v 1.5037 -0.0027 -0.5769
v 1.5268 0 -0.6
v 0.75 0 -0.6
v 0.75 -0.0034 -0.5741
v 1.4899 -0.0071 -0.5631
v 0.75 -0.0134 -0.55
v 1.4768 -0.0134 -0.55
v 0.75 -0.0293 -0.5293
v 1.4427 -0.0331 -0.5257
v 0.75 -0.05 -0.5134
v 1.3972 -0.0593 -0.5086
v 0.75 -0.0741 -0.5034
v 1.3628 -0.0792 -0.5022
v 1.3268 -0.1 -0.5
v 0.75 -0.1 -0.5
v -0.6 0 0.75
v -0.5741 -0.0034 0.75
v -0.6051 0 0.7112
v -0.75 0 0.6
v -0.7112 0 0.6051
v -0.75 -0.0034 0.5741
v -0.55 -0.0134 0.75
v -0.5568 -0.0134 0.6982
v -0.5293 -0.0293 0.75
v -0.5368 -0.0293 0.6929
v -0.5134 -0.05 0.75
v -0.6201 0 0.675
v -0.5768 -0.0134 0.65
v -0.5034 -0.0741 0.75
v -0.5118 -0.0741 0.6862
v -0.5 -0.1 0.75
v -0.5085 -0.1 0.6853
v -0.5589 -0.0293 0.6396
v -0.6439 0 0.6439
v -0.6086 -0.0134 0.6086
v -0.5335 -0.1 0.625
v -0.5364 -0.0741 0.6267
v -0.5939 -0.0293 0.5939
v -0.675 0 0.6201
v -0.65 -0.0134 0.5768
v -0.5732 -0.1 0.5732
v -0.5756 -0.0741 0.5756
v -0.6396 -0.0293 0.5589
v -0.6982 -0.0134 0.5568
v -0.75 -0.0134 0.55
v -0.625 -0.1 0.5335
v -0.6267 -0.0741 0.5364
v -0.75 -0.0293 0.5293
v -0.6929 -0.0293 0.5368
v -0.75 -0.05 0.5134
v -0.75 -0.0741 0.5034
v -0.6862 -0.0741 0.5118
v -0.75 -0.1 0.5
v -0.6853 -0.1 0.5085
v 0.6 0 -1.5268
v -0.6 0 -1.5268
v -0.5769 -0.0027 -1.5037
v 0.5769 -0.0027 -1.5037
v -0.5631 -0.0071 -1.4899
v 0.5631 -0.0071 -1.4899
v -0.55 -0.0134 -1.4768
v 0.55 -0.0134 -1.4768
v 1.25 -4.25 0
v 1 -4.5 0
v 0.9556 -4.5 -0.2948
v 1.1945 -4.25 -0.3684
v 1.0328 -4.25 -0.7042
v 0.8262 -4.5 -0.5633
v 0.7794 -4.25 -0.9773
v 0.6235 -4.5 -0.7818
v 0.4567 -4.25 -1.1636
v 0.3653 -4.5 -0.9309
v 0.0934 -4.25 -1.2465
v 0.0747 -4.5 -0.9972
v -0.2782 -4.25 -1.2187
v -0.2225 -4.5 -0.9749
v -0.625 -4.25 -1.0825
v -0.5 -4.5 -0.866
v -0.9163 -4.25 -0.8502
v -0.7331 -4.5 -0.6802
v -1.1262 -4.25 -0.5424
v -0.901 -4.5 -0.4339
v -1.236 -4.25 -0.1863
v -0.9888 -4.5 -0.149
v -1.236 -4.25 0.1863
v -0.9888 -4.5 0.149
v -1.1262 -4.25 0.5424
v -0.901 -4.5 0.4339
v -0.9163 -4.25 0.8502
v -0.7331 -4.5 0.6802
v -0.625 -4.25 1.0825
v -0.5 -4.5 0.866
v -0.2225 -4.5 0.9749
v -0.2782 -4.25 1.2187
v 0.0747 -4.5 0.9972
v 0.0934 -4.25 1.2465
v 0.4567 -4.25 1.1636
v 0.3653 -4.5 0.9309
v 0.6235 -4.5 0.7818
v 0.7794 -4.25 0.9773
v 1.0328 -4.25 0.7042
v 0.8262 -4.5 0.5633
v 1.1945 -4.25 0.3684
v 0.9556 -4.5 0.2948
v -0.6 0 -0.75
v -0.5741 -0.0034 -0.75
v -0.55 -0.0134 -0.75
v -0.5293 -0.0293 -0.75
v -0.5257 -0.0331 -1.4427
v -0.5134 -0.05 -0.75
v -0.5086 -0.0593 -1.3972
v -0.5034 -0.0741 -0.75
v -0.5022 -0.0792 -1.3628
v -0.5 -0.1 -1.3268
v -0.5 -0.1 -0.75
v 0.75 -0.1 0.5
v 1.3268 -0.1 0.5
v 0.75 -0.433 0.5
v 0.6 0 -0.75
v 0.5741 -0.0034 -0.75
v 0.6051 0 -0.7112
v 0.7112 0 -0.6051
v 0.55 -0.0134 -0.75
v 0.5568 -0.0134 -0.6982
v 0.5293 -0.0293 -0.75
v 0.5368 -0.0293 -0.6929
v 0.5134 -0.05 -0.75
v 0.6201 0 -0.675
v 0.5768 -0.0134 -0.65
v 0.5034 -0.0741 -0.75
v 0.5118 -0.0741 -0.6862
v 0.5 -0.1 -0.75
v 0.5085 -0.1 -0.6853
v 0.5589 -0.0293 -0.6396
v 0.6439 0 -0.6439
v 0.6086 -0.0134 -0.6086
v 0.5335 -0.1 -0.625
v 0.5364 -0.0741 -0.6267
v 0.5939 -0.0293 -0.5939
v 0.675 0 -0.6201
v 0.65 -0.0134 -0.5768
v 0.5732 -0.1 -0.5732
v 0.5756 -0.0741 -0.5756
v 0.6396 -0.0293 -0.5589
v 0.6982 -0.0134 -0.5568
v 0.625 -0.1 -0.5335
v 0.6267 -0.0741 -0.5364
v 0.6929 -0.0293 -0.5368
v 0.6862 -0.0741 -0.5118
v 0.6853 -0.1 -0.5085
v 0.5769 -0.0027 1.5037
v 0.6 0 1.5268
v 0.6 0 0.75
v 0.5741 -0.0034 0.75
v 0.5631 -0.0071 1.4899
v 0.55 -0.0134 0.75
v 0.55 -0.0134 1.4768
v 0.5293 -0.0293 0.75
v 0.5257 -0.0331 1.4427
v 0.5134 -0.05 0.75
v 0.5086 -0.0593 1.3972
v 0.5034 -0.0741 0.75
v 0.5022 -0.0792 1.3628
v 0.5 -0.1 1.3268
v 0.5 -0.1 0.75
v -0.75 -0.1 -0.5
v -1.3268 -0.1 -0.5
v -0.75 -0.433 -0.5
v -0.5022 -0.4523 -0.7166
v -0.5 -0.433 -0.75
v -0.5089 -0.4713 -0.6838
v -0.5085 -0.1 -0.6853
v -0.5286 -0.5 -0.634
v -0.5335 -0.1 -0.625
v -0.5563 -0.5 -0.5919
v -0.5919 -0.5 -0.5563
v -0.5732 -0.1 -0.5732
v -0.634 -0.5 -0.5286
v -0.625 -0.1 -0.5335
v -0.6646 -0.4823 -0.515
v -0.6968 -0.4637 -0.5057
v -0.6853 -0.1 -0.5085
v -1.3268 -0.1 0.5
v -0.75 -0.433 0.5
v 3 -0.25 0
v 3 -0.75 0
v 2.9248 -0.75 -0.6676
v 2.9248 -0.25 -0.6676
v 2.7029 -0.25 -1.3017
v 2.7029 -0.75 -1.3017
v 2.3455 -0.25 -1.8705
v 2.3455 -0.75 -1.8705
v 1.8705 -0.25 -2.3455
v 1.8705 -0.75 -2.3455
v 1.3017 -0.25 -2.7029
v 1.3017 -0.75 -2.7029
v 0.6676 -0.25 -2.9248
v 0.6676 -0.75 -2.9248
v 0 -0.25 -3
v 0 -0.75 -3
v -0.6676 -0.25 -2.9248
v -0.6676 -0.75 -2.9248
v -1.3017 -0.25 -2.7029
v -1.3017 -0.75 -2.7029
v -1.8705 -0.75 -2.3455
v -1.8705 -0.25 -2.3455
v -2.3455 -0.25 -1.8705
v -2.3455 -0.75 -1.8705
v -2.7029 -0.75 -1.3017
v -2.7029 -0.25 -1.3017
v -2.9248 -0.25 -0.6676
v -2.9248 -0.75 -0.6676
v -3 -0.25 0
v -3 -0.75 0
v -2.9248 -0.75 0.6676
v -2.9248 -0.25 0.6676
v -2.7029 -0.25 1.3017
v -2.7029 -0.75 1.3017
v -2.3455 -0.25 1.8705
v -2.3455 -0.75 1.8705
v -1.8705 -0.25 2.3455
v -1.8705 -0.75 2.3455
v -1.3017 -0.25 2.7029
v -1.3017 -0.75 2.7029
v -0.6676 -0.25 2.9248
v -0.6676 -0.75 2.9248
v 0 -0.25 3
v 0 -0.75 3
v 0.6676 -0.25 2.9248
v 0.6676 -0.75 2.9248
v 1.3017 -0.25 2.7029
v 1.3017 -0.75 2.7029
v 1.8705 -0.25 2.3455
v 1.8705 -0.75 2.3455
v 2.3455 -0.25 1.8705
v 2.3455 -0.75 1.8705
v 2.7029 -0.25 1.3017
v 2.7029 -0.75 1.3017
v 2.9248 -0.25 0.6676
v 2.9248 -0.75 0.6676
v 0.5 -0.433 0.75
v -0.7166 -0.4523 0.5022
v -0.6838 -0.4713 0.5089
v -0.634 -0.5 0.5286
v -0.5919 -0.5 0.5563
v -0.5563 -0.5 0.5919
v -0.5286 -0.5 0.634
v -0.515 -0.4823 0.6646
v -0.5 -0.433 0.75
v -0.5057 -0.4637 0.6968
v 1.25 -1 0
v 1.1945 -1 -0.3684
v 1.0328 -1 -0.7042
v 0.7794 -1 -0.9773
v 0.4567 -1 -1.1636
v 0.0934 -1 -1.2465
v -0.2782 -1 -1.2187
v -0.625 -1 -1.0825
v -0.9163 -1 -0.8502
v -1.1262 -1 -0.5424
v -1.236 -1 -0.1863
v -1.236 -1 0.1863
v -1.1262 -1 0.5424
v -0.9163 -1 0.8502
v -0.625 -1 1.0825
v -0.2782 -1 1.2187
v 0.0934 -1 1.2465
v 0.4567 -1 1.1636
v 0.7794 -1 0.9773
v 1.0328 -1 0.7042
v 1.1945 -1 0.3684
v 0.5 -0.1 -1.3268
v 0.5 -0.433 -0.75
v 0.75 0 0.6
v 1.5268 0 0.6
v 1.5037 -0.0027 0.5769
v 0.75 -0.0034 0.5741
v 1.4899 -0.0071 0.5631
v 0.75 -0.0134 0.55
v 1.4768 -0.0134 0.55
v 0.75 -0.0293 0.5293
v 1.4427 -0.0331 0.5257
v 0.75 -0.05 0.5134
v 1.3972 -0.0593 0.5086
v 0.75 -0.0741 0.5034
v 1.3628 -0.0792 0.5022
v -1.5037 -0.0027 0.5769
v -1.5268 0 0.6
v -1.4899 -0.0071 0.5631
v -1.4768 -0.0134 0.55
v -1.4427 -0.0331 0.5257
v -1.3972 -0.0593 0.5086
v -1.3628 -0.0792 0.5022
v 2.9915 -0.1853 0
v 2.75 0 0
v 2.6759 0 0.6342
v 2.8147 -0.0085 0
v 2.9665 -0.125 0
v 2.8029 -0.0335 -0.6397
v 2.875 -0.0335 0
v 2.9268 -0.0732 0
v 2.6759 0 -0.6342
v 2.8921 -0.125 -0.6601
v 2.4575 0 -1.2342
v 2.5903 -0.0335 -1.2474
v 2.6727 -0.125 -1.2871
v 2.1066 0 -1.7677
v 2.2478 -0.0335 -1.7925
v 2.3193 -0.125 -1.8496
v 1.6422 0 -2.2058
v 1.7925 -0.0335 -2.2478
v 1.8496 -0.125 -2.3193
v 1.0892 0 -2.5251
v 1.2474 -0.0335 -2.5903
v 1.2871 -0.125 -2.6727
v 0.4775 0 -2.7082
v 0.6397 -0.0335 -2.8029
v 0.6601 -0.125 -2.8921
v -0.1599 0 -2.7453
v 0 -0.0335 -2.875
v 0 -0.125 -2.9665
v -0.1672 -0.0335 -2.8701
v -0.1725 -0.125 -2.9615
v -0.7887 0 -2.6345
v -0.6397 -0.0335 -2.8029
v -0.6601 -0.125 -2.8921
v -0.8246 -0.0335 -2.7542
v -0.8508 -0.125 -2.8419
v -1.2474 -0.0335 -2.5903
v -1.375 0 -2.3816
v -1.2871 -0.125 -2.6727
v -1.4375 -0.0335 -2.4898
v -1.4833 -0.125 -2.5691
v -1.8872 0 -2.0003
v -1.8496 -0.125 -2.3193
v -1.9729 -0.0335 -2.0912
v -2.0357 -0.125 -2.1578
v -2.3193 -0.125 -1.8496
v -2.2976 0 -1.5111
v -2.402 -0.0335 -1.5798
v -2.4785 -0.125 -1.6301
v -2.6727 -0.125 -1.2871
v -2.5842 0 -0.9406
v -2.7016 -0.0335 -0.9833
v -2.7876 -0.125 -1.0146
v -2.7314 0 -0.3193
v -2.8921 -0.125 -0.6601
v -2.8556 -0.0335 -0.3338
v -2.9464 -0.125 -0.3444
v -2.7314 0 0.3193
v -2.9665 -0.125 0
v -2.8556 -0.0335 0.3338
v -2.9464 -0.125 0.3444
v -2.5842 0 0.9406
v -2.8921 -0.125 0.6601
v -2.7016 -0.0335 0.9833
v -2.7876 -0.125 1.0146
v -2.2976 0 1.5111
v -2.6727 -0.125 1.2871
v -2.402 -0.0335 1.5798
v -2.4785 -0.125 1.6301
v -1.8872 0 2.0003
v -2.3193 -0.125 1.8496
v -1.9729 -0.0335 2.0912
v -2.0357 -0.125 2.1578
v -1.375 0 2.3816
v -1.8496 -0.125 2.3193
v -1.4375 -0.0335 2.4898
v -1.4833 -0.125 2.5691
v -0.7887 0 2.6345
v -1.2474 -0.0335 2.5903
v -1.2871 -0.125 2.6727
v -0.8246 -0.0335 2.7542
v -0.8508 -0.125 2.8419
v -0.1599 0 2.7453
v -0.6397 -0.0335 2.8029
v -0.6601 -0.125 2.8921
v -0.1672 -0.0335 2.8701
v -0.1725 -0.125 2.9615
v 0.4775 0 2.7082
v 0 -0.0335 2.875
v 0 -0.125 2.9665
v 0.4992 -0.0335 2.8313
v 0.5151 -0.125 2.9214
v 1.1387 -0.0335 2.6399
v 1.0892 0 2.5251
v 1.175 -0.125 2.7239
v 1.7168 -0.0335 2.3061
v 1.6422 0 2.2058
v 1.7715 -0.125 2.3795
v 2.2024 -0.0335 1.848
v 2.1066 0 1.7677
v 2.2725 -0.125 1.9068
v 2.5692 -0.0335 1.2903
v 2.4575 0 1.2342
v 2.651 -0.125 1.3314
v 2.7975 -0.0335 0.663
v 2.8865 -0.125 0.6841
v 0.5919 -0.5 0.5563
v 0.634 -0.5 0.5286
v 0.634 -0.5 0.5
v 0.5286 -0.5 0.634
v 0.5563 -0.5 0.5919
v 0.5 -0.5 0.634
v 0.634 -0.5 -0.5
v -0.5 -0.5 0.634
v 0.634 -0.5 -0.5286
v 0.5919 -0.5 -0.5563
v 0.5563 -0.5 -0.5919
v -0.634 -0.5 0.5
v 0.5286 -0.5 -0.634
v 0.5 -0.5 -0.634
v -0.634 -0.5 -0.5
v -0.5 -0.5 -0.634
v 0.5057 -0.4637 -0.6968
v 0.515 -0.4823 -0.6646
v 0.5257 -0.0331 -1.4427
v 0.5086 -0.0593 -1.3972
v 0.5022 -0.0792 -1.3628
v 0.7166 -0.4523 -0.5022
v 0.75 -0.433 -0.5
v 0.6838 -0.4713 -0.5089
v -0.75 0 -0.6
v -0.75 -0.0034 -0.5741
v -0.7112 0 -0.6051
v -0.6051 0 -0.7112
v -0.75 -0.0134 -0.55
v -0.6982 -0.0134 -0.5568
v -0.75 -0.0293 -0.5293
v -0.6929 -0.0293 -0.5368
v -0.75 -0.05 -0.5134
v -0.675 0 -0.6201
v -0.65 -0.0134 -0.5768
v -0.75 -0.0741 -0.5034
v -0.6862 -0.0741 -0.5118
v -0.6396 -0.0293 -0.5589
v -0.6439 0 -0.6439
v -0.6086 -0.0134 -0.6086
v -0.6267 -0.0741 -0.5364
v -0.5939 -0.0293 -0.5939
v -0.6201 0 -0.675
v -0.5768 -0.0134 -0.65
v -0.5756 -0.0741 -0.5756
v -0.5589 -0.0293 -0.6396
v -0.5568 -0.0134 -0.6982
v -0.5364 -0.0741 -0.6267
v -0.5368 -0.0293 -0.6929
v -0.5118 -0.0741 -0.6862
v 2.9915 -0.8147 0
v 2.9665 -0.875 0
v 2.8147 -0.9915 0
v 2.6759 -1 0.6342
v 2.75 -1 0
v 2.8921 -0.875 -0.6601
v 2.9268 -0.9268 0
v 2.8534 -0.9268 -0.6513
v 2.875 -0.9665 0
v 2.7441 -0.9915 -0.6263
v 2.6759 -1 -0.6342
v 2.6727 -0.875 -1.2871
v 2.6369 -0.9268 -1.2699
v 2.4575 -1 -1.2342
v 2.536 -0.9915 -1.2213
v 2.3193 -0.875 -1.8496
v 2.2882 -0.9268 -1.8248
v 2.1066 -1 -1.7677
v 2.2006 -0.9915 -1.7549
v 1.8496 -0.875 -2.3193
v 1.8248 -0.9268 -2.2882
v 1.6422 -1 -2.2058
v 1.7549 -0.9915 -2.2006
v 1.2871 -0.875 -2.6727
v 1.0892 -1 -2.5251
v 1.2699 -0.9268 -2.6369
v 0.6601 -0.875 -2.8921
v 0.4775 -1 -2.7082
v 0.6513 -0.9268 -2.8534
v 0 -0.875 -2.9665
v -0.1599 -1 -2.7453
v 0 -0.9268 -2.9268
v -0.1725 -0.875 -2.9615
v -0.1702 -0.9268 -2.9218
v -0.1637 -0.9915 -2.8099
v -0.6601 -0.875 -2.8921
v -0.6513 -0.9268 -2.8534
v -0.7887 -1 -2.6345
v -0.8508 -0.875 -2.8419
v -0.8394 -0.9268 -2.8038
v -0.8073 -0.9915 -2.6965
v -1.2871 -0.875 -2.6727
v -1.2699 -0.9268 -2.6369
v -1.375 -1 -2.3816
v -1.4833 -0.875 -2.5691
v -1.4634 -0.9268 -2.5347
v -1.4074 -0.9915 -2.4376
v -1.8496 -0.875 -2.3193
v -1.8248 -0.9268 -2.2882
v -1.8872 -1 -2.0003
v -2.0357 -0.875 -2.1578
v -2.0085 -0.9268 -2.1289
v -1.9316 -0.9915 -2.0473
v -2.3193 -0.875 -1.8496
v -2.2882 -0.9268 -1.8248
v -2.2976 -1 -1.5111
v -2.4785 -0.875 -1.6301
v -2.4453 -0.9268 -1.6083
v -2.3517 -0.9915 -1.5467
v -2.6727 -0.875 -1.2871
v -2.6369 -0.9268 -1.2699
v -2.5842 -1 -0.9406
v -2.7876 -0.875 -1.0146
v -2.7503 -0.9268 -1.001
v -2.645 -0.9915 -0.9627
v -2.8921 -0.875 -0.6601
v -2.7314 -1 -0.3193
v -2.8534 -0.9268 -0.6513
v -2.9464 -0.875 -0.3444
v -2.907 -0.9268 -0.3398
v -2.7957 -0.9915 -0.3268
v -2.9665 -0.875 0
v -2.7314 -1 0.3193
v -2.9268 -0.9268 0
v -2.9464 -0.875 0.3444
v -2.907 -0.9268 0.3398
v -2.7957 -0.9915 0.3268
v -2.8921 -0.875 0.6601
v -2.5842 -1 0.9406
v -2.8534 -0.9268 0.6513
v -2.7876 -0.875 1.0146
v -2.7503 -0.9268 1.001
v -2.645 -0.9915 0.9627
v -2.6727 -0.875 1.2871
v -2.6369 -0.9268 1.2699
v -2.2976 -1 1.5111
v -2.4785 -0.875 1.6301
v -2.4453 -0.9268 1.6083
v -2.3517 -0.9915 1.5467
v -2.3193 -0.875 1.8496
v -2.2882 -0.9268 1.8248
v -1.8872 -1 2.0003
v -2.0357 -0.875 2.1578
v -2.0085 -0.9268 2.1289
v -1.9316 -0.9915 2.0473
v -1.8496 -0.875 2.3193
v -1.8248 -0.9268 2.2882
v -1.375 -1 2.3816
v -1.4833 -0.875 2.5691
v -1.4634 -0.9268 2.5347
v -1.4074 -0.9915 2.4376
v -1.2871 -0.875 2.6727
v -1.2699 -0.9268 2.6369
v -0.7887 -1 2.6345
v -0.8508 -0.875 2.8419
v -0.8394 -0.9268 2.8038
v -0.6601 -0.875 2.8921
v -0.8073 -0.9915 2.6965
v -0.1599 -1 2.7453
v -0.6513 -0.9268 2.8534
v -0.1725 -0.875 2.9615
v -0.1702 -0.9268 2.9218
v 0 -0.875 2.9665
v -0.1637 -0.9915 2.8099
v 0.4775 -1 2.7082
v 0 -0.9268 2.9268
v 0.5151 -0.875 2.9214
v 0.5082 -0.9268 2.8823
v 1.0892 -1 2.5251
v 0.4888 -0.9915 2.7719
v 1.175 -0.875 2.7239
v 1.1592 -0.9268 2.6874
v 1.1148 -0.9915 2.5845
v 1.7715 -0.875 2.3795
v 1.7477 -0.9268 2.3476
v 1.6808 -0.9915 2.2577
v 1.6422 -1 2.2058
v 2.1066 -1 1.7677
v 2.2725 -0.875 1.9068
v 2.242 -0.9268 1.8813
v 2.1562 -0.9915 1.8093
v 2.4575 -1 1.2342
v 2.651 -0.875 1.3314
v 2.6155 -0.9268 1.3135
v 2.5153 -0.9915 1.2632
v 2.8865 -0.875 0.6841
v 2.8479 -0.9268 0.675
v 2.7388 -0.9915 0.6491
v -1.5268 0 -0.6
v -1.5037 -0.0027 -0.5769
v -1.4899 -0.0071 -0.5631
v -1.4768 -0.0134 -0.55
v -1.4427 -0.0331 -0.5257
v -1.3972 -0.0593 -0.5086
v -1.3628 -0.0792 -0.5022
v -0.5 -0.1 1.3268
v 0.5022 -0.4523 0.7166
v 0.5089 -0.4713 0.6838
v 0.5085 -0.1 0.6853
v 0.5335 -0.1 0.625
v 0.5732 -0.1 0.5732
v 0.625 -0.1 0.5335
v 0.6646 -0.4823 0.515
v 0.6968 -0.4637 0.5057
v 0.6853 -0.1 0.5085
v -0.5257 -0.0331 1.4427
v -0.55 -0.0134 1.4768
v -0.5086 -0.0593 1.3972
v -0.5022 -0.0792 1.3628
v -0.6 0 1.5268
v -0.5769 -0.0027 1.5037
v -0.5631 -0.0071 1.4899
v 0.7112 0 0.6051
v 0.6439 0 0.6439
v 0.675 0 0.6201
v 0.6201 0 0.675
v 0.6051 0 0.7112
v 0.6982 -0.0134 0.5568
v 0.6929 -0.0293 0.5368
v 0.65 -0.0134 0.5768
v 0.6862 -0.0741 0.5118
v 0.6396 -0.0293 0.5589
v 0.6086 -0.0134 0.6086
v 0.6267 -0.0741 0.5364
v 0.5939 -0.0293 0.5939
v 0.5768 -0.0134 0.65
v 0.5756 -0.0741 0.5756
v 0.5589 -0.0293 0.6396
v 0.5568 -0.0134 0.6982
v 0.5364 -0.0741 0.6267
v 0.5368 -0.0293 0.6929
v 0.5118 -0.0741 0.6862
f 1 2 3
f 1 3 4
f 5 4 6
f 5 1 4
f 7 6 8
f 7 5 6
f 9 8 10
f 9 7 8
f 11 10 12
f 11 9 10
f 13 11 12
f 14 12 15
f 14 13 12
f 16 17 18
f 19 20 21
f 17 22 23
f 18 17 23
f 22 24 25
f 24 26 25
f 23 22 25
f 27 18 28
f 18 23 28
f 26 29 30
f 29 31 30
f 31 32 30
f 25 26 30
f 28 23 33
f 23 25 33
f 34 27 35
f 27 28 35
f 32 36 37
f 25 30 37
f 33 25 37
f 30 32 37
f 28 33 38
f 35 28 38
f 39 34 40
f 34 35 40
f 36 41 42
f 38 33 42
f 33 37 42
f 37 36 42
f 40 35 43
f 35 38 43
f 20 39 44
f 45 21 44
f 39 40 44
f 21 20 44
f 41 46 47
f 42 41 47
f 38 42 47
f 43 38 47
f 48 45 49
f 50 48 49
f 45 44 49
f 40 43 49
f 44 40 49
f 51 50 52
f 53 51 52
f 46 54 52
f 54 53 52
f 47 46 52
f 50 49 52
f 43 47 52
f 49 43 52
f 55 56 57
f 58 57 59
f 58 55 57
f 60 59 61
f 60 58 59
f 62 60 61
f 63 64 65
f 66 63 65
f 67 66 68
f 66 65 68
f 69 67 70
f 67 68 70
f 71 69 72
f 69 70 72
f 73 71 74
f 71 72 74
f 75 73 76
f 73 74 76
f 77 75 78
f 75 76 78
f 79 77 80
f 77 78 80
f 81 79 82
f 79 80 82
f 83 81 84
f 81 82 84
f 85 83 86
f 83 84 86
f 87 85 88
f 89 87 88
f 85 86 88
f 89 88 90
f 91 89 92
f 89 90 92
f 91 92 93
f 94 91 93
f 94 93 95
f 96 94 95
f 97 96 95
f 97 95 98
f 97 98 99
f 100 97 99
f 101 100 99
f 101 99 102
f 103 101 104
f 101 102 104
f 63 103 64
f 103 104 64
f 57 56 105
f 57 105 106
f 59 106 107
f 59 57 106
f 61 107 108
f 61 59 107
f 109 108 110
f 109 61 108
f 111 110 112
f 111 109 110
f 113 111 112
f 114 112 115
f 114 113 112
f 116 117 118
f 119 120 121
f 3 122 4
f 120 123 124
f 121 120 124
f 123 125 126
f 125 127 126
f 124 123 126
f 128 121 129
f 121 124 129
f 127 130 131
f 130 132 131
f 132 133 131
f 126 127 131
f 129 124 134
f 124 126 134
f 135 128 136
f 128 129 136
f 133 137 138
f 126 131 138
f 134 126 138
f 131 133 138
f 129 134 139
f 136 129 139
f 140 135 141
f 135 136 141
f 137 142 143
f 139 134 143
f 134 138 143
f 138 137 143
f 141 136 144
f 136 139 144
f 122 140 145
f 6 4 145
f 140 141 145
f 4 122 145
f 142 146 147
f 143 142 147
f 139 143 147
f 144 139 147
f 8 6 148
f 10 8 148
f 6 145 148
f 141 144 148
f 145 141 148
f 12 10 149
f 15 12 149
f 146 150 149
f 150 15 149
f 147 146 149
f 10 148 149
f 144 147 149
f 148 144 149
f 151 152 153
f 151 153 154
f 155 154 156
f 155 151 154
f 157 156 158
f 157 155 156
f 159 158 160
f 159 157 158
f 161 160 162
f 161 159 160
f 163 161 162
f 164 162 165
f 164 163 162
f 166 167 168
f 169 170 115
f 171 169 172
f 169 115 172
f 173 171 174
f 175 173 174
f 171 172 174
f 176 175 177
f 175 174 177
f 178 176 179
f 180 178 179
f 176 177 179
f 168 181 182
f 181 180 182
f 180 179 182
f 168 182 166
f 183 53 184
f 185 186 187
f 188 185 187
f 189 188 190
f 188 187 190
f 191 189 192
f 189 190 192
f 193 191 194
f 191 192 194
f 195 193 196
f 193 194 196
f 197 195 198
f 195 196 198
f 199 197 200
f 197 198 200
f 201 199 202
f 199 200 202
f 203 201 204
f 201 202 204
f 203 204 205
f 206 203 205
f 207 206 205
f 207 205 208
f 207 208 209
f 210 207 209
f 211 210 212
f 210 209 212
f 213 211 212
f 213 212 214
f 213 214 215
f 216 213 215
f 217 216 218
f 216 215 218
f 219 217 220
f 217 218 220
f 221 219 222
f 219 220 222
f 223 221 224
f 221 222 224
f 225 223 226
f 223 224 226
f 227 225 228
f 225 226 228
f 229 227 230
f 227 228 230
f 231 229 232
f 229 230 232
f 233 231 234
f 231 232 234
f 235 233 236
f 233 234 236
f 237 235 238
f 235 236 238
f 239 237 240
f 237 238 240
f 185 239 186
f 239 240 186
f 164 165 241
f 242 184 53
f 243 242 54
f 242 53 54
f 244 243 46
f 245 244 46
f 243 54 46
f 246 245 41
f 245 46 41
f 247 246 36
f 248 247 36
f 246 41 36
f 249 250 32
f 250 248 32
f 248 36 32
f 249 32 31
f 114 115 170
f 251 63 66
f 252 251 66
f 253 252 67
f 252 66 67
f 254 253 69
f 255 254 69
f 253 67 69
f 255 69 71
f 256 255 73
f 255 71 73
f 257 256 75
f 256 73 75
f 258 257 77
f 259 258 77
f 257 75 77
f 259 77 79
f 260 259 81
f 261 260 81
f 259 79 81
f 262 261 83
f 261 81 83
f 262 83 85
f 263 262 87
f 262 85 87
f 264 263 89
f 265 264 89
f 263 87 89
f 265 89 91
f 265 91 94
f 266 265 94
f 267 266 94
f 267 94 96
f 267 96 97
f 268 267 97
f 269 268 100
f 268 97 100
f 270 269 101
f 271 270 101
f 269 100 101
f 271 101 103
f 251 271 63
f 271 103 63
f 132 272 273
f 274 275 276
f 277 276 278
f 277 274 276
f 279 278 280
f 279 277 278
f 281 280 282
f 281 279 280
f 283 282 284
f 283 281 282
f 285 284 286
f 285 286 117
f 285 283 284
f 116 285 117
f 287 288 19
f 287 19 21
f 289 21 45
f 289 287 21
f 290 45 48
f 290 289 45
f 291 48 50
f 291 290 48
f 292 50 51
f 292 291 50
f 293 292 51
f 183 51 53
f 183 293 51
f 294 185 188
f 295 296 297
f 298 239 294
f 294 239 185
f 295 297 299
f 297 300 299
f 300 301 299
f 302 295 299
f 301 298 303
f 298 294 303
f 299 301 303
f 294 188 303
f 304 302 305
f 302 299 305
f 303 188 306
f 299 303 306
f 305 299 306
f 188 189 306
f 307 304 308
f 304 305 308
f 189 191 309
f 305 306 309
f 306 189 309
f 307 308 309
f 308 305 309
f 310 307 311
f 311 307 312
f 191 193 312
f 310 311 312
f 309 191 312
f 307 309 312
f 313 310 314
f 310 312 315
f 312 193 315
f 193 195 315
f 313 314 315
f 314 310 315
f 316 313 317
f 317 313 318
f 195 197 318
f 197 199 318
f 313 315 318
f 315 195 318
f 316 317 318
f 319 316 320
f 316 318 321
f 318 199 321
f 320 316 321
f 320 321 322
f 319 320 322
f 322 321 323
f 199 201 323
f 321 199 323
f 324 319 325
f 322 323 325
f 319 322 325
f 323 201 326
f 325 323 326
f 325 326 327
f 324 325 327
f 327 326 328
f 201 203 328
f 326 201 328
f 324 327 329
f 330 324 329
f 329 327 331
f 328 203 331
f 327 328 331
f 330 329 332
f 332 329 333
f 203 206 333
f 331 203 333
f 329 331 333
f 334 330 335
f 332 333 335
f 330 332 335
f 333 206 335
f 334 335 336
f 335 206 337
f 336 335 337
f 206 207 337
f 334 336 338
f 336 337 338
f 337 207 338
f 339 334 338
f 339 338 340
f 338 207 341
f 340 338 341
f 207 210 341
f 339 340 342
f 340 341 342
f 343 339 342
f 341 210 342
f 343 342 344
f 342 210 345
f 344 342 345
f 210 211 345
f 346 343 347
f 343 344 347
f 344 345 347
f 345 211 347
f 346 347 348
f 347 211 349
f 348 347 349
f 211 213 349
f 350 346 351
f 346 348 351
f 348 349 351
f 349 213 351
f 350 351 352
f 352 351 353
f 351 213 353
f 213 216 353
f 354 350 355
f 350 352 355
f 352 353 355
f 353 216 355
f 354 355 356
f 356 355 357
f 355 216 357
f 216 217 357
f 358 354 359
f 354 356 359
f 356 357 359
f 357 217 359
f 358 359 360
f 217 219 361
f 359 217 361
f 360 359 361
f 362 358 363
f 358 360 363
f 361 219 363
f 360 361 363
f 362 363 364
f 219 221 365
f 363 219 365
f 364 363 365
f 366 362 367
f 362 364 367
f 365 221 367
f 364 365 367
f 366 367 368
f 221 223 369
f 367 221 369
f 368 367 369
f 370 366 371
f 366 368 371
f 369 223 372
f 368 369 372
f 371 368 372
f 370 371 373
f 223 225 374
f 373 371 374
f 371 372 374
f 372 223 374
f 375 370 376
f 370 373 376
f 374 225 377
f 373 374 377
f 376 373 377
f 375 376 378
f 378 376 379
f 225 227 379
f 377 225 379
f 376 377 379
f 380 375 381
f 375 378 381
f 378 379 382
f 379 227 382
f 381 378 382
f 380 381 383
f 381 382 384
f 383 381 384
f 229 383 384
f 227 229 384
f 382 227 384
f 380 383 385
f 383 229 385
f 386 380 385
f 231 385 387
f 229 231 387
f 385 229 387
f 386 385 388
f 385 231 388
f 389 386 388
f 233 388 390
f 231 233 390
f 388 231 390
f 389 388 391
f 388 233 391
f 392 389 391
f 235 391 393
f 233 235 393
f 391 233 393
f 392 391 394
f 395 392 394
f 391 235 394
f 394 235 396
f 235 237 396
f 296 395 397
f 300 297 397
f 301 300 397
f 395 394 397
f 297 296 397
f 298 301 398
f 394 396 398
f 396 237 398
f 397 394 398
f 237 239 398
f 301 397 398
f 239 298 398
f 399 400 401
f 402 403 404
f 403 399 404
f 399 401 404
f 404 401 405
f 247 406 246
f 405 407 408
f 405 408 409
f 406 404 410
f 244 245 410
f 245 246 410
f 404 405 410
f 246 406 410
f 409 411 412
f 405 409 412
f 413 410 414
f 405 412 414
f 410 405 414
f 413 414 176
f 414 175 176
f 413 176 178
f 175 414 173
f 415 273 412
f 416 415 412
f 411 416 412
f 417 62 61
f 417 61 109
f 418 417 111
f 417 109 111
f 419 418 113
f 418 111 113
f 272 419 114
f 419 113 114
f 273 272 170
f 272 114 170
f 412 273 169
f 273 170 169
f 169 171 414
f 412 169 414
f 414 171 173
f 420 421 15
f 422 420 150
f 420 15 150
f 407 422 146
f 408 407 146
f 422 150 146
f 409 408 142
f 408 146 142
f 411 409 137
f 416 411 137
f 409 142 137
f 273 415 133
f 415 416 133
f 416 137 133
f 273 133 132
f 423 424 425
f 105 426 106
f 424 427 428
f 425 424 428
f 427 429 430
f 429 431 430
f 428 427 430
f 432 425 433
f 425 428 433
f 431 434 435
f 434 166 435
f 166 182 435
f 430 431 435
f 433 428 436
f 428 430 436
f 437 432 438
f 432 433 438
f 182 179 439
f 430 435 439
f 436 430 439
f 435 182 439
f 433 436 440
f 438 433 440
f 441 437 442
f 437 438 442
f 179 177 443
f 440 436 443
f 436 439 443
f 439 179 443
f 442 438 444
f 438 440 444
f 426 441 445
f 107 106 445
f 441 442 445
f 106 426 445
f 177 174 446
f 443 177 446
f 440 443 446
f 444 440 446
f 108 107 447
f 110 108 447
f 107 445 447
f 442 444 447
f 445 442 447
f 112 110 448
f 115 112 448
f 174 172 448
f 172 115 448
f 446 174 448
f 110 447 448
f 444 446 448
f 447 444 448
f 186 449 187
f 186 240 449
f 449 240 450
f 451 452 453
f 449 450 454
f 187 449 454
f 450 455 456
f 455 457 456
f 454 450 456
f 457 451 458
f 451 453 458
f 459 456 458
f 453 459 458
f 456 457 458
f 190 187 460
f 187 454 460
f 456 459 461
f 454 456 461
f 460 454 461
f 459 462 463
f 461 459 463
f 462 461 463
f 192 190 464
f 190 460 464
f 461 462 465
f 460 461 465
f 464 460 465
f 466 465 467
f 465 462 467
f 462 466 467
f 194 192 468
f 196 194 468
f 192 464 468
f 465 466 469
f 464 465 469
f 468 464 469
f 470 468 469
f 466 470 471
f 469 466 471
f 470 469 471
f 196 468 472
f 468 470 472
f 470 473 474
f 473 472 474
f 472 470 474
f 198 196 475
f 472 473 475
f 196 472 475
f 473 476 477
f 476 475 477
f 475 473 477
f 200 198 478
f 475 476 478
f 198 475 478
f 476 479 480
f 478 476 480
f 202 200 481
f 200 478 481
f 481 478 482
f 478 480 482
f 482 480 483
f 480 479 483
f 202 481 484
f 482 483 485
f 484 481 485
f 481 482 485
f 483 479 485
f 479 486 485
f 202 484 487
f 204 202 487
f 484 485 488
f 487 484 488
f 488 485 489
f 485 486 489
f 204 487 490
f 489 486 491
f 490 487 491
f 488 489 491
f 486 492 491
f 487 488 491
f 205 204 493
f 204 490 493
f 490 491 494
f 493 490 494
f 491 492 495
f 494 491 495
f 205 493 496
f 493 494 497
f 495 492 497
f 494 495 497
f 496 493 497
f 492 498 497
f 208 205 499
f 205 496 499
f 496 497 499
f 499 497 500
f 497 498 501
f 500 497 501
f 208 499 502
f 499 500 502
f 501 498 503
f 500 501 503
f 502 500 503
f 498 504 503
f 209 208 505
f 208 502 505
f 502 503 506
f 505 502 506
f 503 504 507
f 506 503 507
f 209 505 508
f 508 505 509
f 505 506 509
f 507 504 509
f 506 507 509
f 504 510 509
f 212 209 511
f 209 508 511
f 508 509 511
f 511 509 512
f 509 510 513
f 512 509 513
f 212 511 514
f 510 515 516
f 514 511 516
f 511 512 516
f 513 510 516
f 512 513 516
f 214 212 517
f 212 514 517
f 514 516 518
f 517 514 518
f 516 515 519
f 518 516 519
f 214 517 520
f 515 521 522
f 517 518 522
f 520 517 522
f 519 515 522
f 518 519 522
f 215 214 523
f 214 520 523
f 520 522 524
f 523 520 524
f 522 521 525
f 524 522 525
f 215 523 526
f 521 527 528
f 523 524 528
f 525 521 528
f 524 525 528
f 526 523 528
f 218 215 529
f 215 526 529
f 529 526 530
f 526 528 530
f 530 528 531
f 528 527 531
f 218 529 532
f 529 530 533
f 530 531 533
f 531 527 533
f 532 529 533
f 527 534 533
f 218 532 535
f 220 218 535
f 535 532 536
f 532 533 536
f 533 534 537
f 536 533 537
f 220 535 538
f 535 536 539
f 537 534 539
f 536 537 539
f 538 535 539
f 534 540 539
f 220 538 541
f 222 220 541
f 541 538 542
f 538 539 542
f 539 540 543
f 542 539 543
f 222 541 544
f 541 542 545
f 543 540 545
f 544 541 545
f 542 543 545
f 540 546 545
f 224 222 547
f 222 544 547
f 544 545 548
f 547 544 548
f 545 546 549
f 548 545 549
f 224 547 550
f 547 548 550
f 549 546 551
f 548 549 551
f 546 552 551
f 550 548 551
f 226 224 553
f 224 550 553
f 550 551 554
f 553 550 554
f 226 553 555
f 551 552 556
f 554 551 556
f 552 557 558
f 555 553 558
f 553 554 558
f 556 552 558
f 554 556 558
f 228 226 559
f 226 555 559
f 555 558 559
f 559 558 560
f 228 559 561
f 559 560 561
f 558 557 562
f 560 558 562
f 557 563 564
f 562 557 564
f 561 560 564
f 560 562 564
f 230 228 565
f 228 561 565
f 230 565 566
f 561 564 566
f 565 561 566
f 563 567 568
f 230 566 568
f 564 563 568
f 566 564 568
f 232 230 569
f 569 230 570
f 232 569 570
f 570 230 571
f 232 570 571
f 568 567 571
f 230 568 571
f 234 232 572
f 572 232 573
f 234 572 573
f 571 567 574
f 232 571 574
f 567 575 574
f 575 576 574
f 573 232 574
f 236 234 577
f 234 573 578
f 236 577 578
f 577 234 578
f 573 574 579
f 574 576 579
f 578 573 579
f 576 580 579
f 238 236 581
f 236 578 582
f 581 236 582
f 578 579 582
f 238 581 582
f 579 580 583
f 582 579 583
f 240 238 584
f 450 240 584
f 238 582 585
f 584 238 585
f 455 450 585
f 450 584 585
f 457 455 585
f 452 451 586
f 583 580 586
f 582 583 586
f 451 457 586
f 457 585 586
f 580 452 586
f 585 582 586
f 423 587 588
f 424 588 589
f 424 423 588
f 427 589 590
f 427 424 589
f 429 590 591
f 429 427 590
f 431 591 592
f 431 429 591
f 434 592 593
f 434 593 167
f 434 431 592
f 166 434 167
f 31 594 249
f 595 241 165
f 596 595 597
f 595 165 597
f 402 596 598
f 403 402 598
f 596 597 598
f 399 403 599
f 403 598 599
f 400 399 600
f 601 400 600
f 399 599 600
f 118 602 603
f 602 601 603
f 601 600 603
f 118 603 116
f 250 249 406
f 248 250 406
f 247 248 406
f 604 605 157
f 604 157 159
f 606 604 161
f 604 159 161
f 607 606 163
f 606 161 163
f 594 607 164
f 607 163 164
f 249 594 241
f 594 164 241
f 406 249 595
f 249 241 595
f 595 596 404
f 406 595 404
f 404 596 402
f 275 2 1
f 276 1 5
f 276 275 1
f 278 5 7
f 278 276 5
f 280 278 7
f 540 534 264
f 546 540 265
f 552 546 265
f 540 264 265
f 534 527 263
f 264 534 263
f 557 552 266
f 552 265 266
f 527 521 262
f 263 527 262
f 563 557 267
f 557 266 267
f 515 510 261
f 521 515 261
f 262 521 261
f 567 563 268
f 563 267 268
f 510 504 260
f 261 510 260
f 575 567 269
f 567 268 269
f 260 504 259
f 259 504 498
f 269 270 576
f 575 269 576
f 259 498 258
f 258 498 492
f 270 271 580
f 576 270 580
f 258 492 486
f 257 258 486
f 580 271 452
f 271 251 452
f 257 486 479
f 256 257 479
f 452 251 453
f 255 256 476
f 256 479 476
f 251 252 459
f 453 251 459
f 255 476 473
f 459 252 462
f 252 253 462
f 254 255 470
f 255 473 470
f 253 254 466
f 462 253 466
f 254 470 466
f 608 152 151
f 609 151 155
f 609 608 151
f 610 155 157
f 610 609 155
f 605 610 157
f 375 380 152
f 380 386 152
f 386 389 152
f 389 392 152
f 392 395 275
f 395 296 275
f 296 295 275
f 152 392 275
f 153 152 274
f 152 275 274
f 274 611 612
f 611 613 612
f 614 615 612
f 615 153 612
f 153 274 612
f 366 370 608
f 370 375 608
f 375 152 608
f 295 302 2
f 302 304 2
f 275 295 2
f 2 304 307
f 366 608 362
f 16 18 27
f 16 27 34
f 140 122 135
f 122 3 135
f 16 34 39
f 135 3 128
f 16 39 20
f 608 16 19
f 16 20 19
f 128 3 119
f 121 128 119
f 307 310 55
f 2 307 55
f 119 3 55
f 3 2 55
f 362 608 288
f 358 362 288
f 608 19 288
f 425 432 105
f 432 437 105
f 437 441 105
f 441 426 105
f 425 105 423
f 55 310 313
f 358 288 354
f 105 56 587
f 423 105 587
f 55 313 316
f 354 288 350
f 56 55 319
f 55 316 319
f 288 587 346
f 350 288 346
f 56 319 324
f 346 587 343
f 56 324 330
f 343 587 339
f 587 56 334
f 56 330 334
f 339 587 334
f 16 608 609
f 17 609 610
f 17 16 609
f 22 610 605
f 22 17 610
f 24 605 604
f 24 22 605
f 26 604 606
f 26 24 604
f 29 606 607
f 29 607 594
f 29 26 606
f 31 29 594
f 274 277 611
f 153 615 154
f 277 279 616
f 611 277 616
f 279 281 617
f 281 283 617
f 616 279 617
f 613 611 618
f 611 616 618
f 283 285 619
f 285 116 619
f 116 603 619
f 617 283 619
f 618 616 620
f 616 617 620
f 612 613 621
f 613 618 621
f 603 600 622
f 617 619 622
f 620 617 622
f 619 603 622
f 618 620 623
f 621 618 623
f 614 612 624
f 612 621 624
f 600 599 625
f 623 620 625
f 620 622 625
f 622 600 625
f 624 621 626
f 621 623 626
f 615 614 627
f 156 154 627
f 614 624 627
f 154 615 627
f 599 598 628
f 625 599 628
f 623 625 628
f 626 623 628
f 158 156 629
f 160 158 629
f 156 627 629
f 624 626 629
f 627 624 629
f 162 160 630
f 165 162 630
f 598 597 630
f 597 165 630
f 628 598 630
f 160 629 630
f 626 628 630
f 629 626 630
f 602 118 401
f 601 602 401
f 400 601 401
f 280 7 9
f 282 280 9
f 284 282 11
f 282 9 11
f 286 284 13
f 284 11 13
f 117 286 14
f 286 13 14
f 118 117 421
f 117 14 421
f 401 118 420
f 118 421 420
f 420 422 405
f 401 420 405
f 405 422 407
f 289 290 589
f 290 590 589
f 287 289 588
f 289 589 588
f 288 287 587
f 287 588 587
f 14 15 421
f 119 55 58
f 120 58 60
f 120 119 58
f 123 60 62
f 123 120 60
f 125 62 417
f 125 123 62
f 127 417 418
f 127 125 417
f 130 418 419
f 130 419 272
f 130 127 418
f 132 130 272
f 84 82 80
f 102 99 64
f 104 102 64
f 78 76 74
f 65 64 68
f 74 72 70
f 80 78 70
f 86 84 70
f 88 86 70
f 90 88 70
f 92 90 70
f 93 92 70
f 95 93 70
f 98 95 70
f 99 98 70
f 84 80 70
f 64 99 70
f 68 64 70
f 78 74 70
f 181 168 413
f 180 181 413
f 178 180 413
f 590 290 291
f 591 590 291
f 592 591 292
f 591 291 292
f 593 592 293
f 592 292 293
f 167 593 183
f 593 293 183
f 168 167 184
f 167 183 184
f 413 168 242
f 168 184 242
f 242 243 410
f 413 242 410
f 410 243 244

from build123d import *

# Parameters (mm, degrees)
CUT_EXTRUDE1_DEPTH = 0.5
CHAMFER1_SIZE      = 0.5
CHAMFER1_SIZE_2    = 0.866025404
FILLET1_R          = 0.25
FILLET2_R          = 0.1
FILLET3_R          = 0.25
CHAMFER2_SIZE      = 0.25


with BuildPart() as part:
    # Sketch1 → Revolve1 (revolve)
    with BuildSketch(Plane.XY):
        Polygon((0, 0), (3, 0), (3, -1), (1.25, -1), (1.25, -4.5), (0, -4.5), align=None)
    revolve(axis=Axis((0, -217.245924753, 0), (0, 1, 0)))

    # Sketch2 → Cut-Extrude1 (cut)
    with BuildSketch(Plane(origin=(0, 0, 0), x_dir=(1, 0, 0), z_dir=(0, 1, 0))):
        Polygon((-0.5, 0.5), (-0.5, 1.5), (0.5, 1.5), (0.5, 0.5), (1.5, 0.5), (1.5, -0.5), (0.5, -0.5), (0.5, -1.5), (-0.5, -1.5), (-0.5, -0.5), (-1.5, -0.5), (-1.5, 0.5), align=None)
    extrude(amount=-CUT_EXTRUDE1_DEPTH, mode=Mode.SUBTRACT)

    # Chamfer1
    # the kernel refuses this chamfer: 0.866025404, 0.5 mm, written as the material it adds along each edge
    with BuildSketch(Plane(origin=(-1.5, -0.5, 0.5), x_dir=(-0.0578938624026749, 0.9983227437537924, 0), z_dir=(0, 0, -1)), Plane(origin=(0.5, -0.5, 1.5), x_dir=(-3.4244955923263397e-15, 0.9983227437537926, 0.057893862402671484), z_dir=(-1, 0, 0)), Plane(origin=(1.5, -0.5, -0.5), x_dir=(0.057893862402667626, 0.9983227437537928, 0), z_dir=(0, 0, 1)), Plane(origin=(-0.5, -0.5, -1.5), x_dir=(-3.4244955923263397e-15, 0.9983227437537926, -0.057893862402671484), z_dir=(1, 0, 0))) as chamfer1_piece_1:
        Polygon((CHAMFER1_SIZE * 0.998322743754, CHAMFER1_SIZE * 0.0578938624027), (-CHAMFER1_SIZE_2 * 0.0578938623883, CHAMFER1_SIZE_2 * 0.998322743505), (0, 0), align=None)
    extrude(amount=1)

    # Fillet1
    # the kernel refuses this fillet: 0.25 mm, written as the material it takes off along each edge
    with BuildSketch(Plane(origin=(-0.5, 0.625, 0.5), x_dir=(-1, 0, 0), z_dir=(0, -1, 0))) as fillet1_piece_1_section:
        with BuildLine():
            CenterArc((FILLET1_R, -FILLET1_R), FILLET1_R, 90, 90)
            Line((0, -FILLET1_R), (0, 0))
            Line((0, 0), (FILLET1_R, 0))
        make_face()
    fillet1_piece_1 = extrude(amount=1.125, mode=Mode.PRIVATE)
    fillet1_piece_1 = split(fillet1_piece_1, bisect_by=Plane(origin=(-0.82036424, -0.392387889, 0.556422311), z_dir=(0.4999999999999566, 0.8660254037844637, 0)), keep=Keep.TOP, mode=Mode.PRIVATE)
    fillet1_piece_1 = split(fillet1_piece_1, bisect_by=Plane(origin=(-0.556422311, -0.392387889, 0.82036424), z_dir=(0, 0.8660254037844637, -0.4999999999999566)), keep=Keep.TOP, mode=Mode.PRIVATE)
    add(fillet1_piece_1, mode=Mode.SUBTRACT)
    with BuildSketch(Plane(origin=(-0.5, 0.625, -0.5), x_dir=(-1, 0, 0), z_dir=(0, -1, 0))) as fillet1_piece_2_section:
        with BuildLine():
            CenterArc((FILLET1_R, FILLET1_R), FILLET1_R, 180, 90)
            Line((0, FILLET1_R), (0, 0))
            Line((0, 0), (FILLET1_R, 0))
        make_face()
    fillet1_piece_2 = extrude(amount=1.125, mode=Mode.PRIVATE)
    fillet1_piece_2 = split(fillet1_piece_2, bisect_by=Plane(origin=(-0.82036424, -0.392387889, -0.556422311), z_dir=(0.4999999999999566, 0.8660254037844637, 0)), keep=Keep.TOP, mode=Mode.PRIVATE)
    fillet1_piece_2 = split(fillet1_piece_2, bisect_by=Plane(origin=(-0.556422311, -0.392387889, -0.82036424), z_dir=(0, 0.8660254037844637, 0.4999999999999566)), keep=Keep.TOP, mode=Mode.PRIVATE)
    add(fillet1_piece_2, mode=Mode.SUBTRACT)
    with BuildSketch(Plane(origin=(0.5, 0.625, 0.5), x_dir=(1, 0, 0), z_dir=(0, -1, 0))) as fillet1_piece_3_section:
        with BuildLine():
            CenterArc((FILLET1_R, FILLET1_R), FILLET1_R, 180, 90)
            Line((0, FILLET1_R), (0, 0))
            Line((0, 0), (FILLET1_R, 0))
        make_face()
    fillet1_piece_3 = extrude(amount=1.125, mode=Mode.PRIVATE)
    fillet1_piece_3 = split(fillet1_piece_3, bisect_by=Plane(origin=(0.82036424, -0.392387889, 0.556422311), z_dir=(-0.4999999999999566, 0.8660254037844637, 0)), keep=Keep.TOP, mode=Mode.PRIVATE)
    fillet1_piece_3 = split(fillet1_piece_3, bisect_by=Plane(origin=(0.556422311, -0.392387889, 0.82036424), z_dir=(0, 0.8660254037844637, -0.4999999999999566)), keep=Keep.TOP, mode=Mode.PRIVATE)
    add(fillet1_piece_3, mode=Mode.SUBTRACT)
    with BuildSketch(Plane(origin=(0.5, 0.625, -0.5), x_dir=(0, 0, -1), z_dir=(0, -1, 0))) as fillet1_piece_4_section:
        with BuildLine():
            CenterArc((FILLET1_R, FILLET1_R), FILLET1_R, 180, 90)
            Line((0, FILLET1_R), (0, 0))
            Line((0, 0), (FILLET1_R, 0))
        make_face()
    fillet1_piece_4 = extrude(amount=1.125, mode=Mode.PRIVATE)
    fillet1_piece_4 = split(fillet1_piece_4, bisect_by=Plane(origin=(0.556422311, -0.392387889, -0.82036424), z_dir=(0, 0.8660254037844637, 0.4999999999999566)), keep=Keep.TOP, mode=Mode.PRIVATE)
    fillet1_piece_4 = split(fillet1_piece_4, bisect_by=Plane(origin=(0.82036424, -0.392387889, -0.556422311), z_dir=(-0.4999999999999566, 0.8660254037844637, 0)), keep=Keep.TOP, mode=Mode.PRIVATE)
    add(fillet1_piece_4, mode=Mode.SUBTRACT)

    # Fillet2
    fillet2_edges = [part.edges().sort_by_distance(p)[0] for p in [
        (-1.5, 0, 0),
        (-1.125, 0, 0.5),
        (0, 0, 1.5),
        (0.5, 0, 1.125),
        (1.5, 0, 0),
        (1.125, 0, -0.5),
        (0, 0, -1.5),
        (-0.5, 0, -1.125),
        (-0.5, 0, 1.125),
        (-1.125, 0, -0.5),
        (0.5, 0, -1.125),
        (1.125, 0, 0.5),
        (0.573223305, 0, -0.573223305),
        (0.573223305, 0, 0.573223305),
        (-0.573223305, 0, -0.573223305),
        (-0.573223305, 0, 0.573223305),
    ]]
    fillet(fillet2_edges, radius=FILLET2_R)

    # Fillet3
    fillet3_edges = [part.edges().sort_by_distance(p)[0] for p in [
        (-3, -1, 0),
        (-3, 0, 0),
    ]]
    fillet(fillet3_edges, radius=FILLET3_R)

    # Chamfer2
    chamfer2_edges = [part.edges().sort_by_distance(p)[0] for p in [
        (-1.25, -4.5, 0),
    ]]
    chamfer(chamfer2_edges, length=CHAMFER2_SIZE)


solid = part.part
